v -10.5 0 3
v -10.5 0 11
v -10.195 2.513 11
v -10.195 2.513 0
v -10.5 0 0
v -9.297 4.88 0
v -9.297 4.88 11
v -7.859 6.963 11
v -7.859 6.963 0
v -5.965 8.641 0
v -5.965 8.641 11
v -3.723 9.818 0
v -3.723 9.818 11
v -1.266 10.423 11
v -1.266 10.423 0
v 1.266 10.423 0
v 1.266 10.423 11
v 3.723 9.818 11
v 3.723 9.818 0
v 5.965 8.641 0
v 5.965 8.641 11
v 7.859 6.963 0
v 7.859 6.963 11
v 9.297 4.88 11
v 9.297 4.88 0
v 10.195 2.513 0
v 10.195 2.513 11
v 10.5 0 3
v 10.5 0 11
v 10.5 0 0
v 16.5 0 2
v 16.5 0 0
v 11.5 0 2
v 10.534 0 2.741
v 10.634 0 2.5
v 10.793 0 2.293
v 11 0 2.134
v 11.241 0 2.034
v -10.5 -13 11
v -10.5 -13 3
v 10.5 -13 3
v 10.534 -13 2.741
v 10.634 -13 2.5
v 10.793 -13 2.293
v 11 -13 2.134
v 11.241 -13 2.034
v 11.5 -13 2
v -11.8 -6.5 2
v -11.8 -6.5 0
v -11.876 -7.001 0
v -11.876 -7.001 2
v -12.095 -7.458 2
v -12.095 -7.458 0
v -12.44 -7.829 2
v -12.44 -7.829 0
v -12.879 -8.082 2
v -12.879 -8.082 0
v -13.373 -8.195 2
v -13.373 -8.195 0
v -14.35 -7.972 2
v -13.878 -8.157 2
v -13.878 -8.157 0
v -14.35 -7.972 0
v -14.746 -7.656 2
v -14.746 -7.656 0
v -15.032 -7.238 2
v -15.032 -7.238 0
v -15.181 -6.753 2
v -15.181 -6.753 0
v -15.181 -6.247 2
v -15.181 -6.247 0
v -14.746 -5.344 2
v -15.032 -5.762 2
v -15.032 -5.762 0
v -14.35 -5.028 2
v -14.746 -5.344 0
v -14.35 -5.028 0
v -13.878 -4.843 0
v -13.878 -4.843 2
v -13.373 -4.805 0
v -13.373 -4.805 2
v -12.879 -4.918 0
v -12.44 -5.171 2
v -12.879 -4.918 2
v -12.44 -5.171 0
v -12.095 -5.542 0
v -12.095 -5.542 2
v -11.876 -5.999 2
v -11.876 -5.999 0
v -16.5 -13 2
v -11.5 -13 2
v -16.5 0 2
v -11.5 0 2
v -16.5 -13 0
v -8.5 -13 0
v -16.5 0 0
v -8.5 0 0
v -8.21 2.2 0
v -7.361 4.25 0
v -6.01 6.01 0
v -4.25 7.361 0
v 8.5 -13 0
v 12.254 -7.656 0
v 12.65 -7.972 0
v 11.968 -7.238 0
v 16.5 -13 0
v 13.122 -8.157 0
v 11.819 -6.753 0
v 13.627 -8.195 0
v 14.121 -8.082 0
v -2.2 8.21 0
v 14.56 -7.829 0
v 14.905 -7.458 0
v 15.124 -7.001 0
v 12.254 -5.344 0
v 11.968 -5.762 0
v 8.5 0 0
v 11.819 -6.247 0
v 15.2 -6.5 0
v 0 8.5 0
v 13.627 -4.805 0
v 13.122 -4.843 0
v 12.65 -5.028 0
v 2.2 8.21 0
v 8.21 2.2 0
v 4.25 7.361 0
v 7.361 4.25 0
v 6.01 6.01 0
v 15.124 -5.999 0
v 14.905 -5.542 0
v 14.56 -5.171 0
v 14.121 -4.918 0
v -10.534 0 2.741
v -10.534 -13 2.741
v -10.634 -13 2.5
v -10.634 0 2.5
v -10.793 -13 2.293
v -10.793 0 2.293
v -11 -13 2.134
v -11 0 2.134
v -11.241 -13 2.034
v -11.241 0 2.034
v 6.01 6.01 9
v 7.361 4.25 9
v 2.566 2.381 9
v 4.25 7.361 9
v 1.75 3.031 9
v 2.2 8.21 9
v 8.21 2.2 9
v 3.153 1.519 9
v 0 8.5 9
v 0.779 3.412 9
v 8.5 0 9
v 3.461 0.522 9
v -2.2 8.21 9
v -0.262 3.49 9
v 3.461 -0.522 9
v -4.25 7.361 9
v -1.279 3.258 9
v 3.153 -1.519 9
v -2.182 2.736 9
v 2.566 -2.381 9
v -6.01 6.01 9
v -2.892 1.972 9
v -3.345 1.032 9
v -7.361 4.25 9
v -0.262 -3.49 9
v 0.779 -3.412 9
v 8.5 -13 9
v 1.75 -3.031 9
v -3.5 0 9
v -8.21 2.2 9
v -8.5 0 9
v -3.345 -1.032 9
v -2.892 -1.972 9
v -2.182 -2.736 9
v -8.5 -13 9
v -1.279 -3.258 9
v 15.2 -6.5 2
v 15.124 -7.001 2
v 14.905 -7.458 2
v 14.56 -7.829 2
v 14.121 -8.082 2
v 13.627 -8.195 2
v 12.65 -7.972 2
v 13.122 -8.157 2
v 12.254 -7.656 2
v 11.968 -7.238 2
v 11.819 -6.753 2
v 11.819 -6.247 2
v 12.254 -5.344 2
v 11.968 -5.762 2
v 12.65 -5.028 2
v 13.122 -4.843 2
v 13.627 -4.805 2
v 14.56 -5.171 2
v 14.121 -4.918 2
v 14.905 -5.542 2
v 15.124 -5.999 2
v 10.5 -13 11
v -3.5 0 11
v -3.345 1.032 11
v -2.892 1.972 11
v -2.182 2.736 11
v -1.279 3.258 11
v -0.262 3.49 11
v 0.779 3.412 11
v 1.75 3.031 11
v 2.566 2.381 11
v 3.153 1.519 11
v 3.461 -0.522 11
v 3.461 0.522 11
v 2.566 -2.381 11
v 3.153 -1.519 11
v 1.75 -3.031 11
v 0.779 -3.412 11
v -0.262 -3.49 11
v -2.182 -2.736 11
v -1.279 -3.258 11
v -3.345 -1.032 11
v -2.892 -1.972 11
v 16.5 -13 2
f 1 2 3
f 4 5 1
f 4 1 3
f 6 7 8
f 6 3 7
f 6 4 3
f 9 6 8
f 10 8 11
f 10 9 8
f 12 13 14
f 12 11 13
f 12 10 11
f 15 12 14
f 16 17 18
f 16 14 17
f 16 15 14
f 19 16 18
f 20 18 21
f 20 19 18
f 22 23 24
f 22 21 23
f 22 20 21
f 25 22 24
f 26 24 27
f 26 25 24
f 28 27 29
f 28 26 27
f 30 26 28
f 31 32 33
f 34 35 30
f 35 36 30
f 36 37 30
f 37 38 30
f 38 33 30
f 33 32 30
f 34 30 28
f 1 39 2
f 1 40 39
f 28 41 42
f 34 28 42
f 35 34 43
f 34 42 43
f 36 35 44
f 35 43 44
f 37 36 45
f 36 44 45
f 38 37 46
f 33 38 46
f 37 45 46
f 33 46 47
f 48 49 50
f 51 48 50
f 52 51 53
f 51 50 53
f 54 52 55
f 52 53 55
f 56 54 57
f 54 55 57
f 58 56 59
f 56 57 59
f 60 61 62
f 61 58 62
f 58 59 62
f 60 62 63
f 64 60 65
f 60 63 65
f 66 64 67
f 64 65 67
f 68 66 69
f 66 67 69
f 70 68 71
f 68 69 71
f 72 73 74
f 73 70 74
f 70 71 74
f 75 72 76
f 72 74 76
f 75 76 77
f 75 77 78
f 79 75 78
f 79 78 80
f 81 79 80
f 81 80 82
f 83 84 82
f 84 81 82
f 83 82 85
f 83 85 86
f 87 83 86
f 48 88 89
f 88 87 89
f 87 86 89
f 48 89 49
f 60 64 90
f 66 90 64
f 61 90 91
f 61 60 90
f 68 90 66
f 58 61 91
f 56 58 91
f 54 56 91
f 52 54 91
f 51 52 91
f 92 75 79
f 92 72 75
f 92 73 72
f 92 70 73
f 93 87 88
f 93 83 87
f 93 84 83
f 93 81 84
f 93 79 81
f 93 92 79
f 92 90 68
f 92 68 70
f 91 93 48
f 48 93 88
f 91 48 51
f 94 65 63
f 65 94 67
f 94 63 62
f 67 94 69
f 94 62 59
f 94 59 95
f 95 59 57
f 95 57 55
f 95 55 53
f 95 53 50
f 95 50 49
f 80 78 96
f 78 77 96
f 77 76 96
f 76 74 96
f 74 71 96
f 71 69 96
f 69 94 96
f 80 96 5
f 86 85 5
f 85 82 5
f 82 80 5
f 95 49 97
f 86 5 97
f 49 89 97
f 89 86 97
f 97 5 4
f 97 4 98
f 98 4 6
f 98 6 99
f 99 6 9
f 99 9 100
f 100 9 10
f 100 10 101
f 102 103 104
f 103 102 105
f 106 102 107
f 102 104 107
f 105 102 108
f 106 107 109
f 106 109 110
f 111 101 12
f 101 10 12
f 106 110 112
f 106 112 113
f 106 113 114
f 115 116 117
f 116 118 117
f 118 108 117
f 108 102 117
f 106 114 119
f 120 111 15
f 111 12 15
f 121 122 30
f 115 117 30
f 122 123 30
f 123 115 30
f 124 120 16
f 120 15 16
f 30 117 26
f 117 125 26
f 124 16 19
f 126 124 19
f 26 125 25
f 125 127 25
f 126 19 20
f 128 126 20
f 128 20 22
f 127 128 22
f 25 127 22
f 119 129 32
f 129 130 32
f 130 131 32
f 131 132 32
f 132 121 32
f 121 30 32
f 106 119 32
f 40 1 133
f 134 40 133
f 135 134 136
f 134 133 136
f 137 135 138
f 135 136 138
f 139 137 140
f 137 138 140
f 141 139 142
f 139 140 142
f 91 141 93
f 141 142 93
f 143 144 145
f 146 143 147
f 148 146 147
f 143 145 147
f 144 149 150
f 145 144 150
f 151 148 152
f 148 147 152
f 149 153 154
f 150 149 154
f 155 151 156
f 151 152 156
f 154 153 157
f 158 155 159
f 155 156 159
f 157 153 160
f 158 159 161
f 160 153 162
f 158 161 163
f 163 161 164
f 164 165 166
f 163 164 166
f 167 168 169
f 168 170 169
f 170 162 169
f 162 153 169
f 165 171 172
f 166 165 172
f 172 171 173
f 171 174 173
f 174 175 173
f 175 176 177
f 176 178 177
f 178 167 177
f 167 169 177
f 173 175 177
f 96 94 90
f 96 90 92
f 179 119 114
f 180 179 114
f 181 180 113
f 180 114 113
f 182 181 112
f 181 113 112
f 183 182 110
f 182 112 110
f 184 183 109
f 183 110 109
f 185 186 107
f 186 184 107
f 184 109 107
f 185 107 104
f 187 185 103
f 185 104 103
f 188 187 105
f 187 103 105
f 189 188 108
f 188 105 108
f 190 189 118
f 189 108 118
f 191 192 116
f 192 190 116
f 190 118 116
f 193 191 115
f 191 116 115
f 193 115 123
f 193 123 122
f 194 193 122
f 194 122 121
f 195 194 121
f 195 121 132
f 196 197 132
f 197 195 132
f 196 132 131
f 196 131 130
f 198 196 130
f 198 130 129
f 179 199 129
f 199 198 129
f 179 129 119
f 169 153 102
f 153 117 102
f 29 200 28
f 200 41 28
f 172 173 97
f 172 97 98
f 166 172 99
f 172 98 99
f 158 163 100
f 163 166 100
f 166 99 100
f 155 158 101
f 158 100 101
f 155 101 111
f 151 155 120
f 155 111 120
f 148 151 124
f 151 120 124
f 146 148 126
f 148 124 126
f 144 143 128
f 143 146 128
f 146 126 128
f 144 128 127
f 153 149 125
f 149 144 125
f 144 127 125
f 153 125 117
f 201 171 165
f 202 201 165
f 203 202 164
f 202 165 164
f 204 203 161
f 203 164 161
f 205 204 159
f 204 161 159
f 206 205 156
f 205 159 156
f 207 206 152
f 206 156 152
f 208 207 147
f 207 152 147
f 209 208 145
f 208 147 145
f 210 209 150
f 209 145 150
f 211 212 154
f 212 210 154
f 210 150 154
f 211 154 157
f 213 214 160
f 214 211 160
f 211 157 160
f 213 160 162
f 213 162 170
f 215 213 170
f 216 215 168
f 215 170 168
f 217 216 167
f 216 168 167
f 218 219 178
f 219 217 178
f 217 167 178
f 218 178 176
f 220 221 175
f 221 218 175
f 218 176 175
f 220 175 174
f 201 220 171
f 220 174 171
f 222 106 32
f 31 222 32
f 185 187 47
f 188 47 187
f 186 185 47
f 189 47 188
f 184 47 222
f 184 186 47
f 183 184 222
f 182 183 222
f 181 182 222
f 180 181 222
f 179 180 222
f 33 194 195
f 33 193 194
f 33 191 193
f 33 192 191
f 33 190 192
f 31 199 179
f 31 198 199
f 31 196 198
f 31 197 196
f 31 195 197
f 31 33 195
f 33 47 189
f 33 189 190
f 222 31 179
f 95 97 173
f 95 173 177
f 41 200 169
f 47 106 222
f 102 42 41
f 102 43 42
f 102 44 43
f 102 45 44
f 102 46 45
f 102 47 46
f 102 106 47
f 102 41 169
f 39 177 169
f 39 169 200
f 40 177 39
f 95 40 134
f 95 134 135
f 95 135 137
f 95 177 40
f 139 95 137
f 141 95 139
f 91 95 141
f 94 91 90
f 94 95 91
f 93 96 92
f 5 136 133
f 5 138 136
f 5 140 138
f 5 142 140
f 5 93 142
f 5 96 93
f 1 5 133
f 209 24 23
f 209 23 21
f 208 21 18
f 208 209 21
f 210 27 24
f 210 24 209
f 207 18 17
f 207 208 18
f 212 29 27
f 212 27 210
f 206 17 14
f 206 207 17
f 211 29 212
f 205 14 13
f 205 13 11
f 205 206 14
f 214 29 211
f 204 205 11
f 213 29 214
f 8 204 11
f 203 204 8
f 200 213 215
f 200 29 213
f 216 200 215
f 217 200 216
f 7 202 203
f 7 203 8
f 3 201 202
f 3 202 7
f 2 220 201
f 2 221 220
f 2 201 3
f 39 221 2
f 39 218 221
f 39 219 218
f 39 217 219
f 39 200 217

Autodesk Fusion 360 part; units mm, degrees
sketch "Esquisse1" plane through (0, 0, 0) normal (0, 0, 1) x (1, 0, 0)
  line L0 (-8.5, 0) -> (8.5, 0)
  line L1 (8.5, 0) -> (8.5, -11)
  line L2 (8.5, -11) -> (-8.5, -11) construction
  line L3 (-8.5, -11) -> (-8.5, 0)
  circle A0 centre (0, 0) radius 3.5
  arc A1 (8.5, 0) -> (-8.5, 0) centre (0, 0) ccw
  line L4 (10.5, 0) -> (10.5, -13)
  line L5 (10.5, -13) -> (-10.5, -13)
  line L6 (-10.5, -13) -> (-10.5, 0)
  arc A2 (10.5, 0) -> (-10.5, 0) centre (0, 0) ccw
  line L7 (-8.5, -11) -> (-8.5, -13)
  line L8 (8.5, -11) -> (8.5, -13)
  line L9 (10.5, -13) -> (16.5, -13)
  line L10 (16.5, -13) -> (16.5, 0)
  line L11 (16.5, 0) -> (10.5, 0)
  line L12 (10.5, 0) -> (10.5, -13)
  line L13 (0, 0) -> (0, -13) construction
  line L14 (-16.5, -13) -> (-16.5, 0)
  line L15 (-10.5, -13) -> (-16.5, -13)
  line L16 (-16.5, 0) -> (-10.5, 0)
  circle A3 centre (13.5, -6.5) radius 1.7
  line L17 (16.5, -6.5) -> (10.5, -6.5) construction
  line L18 (13.5, 0) -> (13.5, -13) construction
  circle A4 centre (-13.5, -6.5) radius 1.7
  dimension "d1" = 17
  dimension "d2" = 17
  dimension "d3" = 11
  dimension "d4" = 7
  dimension "d5" = -2
  dimension "d6" = 6
  dimension "d7" = 3.4
extrude "Extrusion1" add sketch "Esquisse1" along normal blind 2 contours L4 L9 L10 L11 L12 | L6 L14 L15 L16 makes body 1 at (-13.4577, -11.3984, 0) makes body 2 at (13.5423, -11.3984, 0)
extrude "Extrusion2" add sketch "Esquisse1" along normal blind 9 contours L1 L3 A1 L4 L5 L6 A2 L7 L8 L12 bodies 1 2
sketch "Esquisse2" plane through (0, 0, 9) normal (0, 0, 1) x (-1, 0, 0)
  line L0 (8.5, 13) -> (8.5, 0)
  arc A0 (-8.5, 0) -> (8.5, 0) centre (0, 0) ccw
  line L1 (-8.5, 0) -> (-8.5, 13)
  line L2 (-8.5, 13) -> (-10.5, 13)
  line L3 (-10.5, 13) -> (-10.5, 0)
  arc A1 (-10.5, 0) -> (10.5, 0) centre (0, 0) ccw
  line L4 (10.5, 0) -> (10.5, 13)
  line L5 (10.5, 13) -> (8.5, 13)
  circle A2 centre (0, 0) radius 3.5
  line L6 (-10.5, 13) -> (10.5, 13)
  line L7 (10.5, 13) -> (10.5, 0)
  arc A3 (-10.5, 0) -> (10.5, 0) centre (0, 0) ccw
  line L8 (-10.5, 0) -> (-10.5, 13)
extrude "Extrusion3" add sketch "Esquisse2" along normal blind 2 bodies 1
fillet "Congé1" radius 1 2 edges at (10.5, -6.5, 2) (-10.5, -6.5, 2) on bodies 1
